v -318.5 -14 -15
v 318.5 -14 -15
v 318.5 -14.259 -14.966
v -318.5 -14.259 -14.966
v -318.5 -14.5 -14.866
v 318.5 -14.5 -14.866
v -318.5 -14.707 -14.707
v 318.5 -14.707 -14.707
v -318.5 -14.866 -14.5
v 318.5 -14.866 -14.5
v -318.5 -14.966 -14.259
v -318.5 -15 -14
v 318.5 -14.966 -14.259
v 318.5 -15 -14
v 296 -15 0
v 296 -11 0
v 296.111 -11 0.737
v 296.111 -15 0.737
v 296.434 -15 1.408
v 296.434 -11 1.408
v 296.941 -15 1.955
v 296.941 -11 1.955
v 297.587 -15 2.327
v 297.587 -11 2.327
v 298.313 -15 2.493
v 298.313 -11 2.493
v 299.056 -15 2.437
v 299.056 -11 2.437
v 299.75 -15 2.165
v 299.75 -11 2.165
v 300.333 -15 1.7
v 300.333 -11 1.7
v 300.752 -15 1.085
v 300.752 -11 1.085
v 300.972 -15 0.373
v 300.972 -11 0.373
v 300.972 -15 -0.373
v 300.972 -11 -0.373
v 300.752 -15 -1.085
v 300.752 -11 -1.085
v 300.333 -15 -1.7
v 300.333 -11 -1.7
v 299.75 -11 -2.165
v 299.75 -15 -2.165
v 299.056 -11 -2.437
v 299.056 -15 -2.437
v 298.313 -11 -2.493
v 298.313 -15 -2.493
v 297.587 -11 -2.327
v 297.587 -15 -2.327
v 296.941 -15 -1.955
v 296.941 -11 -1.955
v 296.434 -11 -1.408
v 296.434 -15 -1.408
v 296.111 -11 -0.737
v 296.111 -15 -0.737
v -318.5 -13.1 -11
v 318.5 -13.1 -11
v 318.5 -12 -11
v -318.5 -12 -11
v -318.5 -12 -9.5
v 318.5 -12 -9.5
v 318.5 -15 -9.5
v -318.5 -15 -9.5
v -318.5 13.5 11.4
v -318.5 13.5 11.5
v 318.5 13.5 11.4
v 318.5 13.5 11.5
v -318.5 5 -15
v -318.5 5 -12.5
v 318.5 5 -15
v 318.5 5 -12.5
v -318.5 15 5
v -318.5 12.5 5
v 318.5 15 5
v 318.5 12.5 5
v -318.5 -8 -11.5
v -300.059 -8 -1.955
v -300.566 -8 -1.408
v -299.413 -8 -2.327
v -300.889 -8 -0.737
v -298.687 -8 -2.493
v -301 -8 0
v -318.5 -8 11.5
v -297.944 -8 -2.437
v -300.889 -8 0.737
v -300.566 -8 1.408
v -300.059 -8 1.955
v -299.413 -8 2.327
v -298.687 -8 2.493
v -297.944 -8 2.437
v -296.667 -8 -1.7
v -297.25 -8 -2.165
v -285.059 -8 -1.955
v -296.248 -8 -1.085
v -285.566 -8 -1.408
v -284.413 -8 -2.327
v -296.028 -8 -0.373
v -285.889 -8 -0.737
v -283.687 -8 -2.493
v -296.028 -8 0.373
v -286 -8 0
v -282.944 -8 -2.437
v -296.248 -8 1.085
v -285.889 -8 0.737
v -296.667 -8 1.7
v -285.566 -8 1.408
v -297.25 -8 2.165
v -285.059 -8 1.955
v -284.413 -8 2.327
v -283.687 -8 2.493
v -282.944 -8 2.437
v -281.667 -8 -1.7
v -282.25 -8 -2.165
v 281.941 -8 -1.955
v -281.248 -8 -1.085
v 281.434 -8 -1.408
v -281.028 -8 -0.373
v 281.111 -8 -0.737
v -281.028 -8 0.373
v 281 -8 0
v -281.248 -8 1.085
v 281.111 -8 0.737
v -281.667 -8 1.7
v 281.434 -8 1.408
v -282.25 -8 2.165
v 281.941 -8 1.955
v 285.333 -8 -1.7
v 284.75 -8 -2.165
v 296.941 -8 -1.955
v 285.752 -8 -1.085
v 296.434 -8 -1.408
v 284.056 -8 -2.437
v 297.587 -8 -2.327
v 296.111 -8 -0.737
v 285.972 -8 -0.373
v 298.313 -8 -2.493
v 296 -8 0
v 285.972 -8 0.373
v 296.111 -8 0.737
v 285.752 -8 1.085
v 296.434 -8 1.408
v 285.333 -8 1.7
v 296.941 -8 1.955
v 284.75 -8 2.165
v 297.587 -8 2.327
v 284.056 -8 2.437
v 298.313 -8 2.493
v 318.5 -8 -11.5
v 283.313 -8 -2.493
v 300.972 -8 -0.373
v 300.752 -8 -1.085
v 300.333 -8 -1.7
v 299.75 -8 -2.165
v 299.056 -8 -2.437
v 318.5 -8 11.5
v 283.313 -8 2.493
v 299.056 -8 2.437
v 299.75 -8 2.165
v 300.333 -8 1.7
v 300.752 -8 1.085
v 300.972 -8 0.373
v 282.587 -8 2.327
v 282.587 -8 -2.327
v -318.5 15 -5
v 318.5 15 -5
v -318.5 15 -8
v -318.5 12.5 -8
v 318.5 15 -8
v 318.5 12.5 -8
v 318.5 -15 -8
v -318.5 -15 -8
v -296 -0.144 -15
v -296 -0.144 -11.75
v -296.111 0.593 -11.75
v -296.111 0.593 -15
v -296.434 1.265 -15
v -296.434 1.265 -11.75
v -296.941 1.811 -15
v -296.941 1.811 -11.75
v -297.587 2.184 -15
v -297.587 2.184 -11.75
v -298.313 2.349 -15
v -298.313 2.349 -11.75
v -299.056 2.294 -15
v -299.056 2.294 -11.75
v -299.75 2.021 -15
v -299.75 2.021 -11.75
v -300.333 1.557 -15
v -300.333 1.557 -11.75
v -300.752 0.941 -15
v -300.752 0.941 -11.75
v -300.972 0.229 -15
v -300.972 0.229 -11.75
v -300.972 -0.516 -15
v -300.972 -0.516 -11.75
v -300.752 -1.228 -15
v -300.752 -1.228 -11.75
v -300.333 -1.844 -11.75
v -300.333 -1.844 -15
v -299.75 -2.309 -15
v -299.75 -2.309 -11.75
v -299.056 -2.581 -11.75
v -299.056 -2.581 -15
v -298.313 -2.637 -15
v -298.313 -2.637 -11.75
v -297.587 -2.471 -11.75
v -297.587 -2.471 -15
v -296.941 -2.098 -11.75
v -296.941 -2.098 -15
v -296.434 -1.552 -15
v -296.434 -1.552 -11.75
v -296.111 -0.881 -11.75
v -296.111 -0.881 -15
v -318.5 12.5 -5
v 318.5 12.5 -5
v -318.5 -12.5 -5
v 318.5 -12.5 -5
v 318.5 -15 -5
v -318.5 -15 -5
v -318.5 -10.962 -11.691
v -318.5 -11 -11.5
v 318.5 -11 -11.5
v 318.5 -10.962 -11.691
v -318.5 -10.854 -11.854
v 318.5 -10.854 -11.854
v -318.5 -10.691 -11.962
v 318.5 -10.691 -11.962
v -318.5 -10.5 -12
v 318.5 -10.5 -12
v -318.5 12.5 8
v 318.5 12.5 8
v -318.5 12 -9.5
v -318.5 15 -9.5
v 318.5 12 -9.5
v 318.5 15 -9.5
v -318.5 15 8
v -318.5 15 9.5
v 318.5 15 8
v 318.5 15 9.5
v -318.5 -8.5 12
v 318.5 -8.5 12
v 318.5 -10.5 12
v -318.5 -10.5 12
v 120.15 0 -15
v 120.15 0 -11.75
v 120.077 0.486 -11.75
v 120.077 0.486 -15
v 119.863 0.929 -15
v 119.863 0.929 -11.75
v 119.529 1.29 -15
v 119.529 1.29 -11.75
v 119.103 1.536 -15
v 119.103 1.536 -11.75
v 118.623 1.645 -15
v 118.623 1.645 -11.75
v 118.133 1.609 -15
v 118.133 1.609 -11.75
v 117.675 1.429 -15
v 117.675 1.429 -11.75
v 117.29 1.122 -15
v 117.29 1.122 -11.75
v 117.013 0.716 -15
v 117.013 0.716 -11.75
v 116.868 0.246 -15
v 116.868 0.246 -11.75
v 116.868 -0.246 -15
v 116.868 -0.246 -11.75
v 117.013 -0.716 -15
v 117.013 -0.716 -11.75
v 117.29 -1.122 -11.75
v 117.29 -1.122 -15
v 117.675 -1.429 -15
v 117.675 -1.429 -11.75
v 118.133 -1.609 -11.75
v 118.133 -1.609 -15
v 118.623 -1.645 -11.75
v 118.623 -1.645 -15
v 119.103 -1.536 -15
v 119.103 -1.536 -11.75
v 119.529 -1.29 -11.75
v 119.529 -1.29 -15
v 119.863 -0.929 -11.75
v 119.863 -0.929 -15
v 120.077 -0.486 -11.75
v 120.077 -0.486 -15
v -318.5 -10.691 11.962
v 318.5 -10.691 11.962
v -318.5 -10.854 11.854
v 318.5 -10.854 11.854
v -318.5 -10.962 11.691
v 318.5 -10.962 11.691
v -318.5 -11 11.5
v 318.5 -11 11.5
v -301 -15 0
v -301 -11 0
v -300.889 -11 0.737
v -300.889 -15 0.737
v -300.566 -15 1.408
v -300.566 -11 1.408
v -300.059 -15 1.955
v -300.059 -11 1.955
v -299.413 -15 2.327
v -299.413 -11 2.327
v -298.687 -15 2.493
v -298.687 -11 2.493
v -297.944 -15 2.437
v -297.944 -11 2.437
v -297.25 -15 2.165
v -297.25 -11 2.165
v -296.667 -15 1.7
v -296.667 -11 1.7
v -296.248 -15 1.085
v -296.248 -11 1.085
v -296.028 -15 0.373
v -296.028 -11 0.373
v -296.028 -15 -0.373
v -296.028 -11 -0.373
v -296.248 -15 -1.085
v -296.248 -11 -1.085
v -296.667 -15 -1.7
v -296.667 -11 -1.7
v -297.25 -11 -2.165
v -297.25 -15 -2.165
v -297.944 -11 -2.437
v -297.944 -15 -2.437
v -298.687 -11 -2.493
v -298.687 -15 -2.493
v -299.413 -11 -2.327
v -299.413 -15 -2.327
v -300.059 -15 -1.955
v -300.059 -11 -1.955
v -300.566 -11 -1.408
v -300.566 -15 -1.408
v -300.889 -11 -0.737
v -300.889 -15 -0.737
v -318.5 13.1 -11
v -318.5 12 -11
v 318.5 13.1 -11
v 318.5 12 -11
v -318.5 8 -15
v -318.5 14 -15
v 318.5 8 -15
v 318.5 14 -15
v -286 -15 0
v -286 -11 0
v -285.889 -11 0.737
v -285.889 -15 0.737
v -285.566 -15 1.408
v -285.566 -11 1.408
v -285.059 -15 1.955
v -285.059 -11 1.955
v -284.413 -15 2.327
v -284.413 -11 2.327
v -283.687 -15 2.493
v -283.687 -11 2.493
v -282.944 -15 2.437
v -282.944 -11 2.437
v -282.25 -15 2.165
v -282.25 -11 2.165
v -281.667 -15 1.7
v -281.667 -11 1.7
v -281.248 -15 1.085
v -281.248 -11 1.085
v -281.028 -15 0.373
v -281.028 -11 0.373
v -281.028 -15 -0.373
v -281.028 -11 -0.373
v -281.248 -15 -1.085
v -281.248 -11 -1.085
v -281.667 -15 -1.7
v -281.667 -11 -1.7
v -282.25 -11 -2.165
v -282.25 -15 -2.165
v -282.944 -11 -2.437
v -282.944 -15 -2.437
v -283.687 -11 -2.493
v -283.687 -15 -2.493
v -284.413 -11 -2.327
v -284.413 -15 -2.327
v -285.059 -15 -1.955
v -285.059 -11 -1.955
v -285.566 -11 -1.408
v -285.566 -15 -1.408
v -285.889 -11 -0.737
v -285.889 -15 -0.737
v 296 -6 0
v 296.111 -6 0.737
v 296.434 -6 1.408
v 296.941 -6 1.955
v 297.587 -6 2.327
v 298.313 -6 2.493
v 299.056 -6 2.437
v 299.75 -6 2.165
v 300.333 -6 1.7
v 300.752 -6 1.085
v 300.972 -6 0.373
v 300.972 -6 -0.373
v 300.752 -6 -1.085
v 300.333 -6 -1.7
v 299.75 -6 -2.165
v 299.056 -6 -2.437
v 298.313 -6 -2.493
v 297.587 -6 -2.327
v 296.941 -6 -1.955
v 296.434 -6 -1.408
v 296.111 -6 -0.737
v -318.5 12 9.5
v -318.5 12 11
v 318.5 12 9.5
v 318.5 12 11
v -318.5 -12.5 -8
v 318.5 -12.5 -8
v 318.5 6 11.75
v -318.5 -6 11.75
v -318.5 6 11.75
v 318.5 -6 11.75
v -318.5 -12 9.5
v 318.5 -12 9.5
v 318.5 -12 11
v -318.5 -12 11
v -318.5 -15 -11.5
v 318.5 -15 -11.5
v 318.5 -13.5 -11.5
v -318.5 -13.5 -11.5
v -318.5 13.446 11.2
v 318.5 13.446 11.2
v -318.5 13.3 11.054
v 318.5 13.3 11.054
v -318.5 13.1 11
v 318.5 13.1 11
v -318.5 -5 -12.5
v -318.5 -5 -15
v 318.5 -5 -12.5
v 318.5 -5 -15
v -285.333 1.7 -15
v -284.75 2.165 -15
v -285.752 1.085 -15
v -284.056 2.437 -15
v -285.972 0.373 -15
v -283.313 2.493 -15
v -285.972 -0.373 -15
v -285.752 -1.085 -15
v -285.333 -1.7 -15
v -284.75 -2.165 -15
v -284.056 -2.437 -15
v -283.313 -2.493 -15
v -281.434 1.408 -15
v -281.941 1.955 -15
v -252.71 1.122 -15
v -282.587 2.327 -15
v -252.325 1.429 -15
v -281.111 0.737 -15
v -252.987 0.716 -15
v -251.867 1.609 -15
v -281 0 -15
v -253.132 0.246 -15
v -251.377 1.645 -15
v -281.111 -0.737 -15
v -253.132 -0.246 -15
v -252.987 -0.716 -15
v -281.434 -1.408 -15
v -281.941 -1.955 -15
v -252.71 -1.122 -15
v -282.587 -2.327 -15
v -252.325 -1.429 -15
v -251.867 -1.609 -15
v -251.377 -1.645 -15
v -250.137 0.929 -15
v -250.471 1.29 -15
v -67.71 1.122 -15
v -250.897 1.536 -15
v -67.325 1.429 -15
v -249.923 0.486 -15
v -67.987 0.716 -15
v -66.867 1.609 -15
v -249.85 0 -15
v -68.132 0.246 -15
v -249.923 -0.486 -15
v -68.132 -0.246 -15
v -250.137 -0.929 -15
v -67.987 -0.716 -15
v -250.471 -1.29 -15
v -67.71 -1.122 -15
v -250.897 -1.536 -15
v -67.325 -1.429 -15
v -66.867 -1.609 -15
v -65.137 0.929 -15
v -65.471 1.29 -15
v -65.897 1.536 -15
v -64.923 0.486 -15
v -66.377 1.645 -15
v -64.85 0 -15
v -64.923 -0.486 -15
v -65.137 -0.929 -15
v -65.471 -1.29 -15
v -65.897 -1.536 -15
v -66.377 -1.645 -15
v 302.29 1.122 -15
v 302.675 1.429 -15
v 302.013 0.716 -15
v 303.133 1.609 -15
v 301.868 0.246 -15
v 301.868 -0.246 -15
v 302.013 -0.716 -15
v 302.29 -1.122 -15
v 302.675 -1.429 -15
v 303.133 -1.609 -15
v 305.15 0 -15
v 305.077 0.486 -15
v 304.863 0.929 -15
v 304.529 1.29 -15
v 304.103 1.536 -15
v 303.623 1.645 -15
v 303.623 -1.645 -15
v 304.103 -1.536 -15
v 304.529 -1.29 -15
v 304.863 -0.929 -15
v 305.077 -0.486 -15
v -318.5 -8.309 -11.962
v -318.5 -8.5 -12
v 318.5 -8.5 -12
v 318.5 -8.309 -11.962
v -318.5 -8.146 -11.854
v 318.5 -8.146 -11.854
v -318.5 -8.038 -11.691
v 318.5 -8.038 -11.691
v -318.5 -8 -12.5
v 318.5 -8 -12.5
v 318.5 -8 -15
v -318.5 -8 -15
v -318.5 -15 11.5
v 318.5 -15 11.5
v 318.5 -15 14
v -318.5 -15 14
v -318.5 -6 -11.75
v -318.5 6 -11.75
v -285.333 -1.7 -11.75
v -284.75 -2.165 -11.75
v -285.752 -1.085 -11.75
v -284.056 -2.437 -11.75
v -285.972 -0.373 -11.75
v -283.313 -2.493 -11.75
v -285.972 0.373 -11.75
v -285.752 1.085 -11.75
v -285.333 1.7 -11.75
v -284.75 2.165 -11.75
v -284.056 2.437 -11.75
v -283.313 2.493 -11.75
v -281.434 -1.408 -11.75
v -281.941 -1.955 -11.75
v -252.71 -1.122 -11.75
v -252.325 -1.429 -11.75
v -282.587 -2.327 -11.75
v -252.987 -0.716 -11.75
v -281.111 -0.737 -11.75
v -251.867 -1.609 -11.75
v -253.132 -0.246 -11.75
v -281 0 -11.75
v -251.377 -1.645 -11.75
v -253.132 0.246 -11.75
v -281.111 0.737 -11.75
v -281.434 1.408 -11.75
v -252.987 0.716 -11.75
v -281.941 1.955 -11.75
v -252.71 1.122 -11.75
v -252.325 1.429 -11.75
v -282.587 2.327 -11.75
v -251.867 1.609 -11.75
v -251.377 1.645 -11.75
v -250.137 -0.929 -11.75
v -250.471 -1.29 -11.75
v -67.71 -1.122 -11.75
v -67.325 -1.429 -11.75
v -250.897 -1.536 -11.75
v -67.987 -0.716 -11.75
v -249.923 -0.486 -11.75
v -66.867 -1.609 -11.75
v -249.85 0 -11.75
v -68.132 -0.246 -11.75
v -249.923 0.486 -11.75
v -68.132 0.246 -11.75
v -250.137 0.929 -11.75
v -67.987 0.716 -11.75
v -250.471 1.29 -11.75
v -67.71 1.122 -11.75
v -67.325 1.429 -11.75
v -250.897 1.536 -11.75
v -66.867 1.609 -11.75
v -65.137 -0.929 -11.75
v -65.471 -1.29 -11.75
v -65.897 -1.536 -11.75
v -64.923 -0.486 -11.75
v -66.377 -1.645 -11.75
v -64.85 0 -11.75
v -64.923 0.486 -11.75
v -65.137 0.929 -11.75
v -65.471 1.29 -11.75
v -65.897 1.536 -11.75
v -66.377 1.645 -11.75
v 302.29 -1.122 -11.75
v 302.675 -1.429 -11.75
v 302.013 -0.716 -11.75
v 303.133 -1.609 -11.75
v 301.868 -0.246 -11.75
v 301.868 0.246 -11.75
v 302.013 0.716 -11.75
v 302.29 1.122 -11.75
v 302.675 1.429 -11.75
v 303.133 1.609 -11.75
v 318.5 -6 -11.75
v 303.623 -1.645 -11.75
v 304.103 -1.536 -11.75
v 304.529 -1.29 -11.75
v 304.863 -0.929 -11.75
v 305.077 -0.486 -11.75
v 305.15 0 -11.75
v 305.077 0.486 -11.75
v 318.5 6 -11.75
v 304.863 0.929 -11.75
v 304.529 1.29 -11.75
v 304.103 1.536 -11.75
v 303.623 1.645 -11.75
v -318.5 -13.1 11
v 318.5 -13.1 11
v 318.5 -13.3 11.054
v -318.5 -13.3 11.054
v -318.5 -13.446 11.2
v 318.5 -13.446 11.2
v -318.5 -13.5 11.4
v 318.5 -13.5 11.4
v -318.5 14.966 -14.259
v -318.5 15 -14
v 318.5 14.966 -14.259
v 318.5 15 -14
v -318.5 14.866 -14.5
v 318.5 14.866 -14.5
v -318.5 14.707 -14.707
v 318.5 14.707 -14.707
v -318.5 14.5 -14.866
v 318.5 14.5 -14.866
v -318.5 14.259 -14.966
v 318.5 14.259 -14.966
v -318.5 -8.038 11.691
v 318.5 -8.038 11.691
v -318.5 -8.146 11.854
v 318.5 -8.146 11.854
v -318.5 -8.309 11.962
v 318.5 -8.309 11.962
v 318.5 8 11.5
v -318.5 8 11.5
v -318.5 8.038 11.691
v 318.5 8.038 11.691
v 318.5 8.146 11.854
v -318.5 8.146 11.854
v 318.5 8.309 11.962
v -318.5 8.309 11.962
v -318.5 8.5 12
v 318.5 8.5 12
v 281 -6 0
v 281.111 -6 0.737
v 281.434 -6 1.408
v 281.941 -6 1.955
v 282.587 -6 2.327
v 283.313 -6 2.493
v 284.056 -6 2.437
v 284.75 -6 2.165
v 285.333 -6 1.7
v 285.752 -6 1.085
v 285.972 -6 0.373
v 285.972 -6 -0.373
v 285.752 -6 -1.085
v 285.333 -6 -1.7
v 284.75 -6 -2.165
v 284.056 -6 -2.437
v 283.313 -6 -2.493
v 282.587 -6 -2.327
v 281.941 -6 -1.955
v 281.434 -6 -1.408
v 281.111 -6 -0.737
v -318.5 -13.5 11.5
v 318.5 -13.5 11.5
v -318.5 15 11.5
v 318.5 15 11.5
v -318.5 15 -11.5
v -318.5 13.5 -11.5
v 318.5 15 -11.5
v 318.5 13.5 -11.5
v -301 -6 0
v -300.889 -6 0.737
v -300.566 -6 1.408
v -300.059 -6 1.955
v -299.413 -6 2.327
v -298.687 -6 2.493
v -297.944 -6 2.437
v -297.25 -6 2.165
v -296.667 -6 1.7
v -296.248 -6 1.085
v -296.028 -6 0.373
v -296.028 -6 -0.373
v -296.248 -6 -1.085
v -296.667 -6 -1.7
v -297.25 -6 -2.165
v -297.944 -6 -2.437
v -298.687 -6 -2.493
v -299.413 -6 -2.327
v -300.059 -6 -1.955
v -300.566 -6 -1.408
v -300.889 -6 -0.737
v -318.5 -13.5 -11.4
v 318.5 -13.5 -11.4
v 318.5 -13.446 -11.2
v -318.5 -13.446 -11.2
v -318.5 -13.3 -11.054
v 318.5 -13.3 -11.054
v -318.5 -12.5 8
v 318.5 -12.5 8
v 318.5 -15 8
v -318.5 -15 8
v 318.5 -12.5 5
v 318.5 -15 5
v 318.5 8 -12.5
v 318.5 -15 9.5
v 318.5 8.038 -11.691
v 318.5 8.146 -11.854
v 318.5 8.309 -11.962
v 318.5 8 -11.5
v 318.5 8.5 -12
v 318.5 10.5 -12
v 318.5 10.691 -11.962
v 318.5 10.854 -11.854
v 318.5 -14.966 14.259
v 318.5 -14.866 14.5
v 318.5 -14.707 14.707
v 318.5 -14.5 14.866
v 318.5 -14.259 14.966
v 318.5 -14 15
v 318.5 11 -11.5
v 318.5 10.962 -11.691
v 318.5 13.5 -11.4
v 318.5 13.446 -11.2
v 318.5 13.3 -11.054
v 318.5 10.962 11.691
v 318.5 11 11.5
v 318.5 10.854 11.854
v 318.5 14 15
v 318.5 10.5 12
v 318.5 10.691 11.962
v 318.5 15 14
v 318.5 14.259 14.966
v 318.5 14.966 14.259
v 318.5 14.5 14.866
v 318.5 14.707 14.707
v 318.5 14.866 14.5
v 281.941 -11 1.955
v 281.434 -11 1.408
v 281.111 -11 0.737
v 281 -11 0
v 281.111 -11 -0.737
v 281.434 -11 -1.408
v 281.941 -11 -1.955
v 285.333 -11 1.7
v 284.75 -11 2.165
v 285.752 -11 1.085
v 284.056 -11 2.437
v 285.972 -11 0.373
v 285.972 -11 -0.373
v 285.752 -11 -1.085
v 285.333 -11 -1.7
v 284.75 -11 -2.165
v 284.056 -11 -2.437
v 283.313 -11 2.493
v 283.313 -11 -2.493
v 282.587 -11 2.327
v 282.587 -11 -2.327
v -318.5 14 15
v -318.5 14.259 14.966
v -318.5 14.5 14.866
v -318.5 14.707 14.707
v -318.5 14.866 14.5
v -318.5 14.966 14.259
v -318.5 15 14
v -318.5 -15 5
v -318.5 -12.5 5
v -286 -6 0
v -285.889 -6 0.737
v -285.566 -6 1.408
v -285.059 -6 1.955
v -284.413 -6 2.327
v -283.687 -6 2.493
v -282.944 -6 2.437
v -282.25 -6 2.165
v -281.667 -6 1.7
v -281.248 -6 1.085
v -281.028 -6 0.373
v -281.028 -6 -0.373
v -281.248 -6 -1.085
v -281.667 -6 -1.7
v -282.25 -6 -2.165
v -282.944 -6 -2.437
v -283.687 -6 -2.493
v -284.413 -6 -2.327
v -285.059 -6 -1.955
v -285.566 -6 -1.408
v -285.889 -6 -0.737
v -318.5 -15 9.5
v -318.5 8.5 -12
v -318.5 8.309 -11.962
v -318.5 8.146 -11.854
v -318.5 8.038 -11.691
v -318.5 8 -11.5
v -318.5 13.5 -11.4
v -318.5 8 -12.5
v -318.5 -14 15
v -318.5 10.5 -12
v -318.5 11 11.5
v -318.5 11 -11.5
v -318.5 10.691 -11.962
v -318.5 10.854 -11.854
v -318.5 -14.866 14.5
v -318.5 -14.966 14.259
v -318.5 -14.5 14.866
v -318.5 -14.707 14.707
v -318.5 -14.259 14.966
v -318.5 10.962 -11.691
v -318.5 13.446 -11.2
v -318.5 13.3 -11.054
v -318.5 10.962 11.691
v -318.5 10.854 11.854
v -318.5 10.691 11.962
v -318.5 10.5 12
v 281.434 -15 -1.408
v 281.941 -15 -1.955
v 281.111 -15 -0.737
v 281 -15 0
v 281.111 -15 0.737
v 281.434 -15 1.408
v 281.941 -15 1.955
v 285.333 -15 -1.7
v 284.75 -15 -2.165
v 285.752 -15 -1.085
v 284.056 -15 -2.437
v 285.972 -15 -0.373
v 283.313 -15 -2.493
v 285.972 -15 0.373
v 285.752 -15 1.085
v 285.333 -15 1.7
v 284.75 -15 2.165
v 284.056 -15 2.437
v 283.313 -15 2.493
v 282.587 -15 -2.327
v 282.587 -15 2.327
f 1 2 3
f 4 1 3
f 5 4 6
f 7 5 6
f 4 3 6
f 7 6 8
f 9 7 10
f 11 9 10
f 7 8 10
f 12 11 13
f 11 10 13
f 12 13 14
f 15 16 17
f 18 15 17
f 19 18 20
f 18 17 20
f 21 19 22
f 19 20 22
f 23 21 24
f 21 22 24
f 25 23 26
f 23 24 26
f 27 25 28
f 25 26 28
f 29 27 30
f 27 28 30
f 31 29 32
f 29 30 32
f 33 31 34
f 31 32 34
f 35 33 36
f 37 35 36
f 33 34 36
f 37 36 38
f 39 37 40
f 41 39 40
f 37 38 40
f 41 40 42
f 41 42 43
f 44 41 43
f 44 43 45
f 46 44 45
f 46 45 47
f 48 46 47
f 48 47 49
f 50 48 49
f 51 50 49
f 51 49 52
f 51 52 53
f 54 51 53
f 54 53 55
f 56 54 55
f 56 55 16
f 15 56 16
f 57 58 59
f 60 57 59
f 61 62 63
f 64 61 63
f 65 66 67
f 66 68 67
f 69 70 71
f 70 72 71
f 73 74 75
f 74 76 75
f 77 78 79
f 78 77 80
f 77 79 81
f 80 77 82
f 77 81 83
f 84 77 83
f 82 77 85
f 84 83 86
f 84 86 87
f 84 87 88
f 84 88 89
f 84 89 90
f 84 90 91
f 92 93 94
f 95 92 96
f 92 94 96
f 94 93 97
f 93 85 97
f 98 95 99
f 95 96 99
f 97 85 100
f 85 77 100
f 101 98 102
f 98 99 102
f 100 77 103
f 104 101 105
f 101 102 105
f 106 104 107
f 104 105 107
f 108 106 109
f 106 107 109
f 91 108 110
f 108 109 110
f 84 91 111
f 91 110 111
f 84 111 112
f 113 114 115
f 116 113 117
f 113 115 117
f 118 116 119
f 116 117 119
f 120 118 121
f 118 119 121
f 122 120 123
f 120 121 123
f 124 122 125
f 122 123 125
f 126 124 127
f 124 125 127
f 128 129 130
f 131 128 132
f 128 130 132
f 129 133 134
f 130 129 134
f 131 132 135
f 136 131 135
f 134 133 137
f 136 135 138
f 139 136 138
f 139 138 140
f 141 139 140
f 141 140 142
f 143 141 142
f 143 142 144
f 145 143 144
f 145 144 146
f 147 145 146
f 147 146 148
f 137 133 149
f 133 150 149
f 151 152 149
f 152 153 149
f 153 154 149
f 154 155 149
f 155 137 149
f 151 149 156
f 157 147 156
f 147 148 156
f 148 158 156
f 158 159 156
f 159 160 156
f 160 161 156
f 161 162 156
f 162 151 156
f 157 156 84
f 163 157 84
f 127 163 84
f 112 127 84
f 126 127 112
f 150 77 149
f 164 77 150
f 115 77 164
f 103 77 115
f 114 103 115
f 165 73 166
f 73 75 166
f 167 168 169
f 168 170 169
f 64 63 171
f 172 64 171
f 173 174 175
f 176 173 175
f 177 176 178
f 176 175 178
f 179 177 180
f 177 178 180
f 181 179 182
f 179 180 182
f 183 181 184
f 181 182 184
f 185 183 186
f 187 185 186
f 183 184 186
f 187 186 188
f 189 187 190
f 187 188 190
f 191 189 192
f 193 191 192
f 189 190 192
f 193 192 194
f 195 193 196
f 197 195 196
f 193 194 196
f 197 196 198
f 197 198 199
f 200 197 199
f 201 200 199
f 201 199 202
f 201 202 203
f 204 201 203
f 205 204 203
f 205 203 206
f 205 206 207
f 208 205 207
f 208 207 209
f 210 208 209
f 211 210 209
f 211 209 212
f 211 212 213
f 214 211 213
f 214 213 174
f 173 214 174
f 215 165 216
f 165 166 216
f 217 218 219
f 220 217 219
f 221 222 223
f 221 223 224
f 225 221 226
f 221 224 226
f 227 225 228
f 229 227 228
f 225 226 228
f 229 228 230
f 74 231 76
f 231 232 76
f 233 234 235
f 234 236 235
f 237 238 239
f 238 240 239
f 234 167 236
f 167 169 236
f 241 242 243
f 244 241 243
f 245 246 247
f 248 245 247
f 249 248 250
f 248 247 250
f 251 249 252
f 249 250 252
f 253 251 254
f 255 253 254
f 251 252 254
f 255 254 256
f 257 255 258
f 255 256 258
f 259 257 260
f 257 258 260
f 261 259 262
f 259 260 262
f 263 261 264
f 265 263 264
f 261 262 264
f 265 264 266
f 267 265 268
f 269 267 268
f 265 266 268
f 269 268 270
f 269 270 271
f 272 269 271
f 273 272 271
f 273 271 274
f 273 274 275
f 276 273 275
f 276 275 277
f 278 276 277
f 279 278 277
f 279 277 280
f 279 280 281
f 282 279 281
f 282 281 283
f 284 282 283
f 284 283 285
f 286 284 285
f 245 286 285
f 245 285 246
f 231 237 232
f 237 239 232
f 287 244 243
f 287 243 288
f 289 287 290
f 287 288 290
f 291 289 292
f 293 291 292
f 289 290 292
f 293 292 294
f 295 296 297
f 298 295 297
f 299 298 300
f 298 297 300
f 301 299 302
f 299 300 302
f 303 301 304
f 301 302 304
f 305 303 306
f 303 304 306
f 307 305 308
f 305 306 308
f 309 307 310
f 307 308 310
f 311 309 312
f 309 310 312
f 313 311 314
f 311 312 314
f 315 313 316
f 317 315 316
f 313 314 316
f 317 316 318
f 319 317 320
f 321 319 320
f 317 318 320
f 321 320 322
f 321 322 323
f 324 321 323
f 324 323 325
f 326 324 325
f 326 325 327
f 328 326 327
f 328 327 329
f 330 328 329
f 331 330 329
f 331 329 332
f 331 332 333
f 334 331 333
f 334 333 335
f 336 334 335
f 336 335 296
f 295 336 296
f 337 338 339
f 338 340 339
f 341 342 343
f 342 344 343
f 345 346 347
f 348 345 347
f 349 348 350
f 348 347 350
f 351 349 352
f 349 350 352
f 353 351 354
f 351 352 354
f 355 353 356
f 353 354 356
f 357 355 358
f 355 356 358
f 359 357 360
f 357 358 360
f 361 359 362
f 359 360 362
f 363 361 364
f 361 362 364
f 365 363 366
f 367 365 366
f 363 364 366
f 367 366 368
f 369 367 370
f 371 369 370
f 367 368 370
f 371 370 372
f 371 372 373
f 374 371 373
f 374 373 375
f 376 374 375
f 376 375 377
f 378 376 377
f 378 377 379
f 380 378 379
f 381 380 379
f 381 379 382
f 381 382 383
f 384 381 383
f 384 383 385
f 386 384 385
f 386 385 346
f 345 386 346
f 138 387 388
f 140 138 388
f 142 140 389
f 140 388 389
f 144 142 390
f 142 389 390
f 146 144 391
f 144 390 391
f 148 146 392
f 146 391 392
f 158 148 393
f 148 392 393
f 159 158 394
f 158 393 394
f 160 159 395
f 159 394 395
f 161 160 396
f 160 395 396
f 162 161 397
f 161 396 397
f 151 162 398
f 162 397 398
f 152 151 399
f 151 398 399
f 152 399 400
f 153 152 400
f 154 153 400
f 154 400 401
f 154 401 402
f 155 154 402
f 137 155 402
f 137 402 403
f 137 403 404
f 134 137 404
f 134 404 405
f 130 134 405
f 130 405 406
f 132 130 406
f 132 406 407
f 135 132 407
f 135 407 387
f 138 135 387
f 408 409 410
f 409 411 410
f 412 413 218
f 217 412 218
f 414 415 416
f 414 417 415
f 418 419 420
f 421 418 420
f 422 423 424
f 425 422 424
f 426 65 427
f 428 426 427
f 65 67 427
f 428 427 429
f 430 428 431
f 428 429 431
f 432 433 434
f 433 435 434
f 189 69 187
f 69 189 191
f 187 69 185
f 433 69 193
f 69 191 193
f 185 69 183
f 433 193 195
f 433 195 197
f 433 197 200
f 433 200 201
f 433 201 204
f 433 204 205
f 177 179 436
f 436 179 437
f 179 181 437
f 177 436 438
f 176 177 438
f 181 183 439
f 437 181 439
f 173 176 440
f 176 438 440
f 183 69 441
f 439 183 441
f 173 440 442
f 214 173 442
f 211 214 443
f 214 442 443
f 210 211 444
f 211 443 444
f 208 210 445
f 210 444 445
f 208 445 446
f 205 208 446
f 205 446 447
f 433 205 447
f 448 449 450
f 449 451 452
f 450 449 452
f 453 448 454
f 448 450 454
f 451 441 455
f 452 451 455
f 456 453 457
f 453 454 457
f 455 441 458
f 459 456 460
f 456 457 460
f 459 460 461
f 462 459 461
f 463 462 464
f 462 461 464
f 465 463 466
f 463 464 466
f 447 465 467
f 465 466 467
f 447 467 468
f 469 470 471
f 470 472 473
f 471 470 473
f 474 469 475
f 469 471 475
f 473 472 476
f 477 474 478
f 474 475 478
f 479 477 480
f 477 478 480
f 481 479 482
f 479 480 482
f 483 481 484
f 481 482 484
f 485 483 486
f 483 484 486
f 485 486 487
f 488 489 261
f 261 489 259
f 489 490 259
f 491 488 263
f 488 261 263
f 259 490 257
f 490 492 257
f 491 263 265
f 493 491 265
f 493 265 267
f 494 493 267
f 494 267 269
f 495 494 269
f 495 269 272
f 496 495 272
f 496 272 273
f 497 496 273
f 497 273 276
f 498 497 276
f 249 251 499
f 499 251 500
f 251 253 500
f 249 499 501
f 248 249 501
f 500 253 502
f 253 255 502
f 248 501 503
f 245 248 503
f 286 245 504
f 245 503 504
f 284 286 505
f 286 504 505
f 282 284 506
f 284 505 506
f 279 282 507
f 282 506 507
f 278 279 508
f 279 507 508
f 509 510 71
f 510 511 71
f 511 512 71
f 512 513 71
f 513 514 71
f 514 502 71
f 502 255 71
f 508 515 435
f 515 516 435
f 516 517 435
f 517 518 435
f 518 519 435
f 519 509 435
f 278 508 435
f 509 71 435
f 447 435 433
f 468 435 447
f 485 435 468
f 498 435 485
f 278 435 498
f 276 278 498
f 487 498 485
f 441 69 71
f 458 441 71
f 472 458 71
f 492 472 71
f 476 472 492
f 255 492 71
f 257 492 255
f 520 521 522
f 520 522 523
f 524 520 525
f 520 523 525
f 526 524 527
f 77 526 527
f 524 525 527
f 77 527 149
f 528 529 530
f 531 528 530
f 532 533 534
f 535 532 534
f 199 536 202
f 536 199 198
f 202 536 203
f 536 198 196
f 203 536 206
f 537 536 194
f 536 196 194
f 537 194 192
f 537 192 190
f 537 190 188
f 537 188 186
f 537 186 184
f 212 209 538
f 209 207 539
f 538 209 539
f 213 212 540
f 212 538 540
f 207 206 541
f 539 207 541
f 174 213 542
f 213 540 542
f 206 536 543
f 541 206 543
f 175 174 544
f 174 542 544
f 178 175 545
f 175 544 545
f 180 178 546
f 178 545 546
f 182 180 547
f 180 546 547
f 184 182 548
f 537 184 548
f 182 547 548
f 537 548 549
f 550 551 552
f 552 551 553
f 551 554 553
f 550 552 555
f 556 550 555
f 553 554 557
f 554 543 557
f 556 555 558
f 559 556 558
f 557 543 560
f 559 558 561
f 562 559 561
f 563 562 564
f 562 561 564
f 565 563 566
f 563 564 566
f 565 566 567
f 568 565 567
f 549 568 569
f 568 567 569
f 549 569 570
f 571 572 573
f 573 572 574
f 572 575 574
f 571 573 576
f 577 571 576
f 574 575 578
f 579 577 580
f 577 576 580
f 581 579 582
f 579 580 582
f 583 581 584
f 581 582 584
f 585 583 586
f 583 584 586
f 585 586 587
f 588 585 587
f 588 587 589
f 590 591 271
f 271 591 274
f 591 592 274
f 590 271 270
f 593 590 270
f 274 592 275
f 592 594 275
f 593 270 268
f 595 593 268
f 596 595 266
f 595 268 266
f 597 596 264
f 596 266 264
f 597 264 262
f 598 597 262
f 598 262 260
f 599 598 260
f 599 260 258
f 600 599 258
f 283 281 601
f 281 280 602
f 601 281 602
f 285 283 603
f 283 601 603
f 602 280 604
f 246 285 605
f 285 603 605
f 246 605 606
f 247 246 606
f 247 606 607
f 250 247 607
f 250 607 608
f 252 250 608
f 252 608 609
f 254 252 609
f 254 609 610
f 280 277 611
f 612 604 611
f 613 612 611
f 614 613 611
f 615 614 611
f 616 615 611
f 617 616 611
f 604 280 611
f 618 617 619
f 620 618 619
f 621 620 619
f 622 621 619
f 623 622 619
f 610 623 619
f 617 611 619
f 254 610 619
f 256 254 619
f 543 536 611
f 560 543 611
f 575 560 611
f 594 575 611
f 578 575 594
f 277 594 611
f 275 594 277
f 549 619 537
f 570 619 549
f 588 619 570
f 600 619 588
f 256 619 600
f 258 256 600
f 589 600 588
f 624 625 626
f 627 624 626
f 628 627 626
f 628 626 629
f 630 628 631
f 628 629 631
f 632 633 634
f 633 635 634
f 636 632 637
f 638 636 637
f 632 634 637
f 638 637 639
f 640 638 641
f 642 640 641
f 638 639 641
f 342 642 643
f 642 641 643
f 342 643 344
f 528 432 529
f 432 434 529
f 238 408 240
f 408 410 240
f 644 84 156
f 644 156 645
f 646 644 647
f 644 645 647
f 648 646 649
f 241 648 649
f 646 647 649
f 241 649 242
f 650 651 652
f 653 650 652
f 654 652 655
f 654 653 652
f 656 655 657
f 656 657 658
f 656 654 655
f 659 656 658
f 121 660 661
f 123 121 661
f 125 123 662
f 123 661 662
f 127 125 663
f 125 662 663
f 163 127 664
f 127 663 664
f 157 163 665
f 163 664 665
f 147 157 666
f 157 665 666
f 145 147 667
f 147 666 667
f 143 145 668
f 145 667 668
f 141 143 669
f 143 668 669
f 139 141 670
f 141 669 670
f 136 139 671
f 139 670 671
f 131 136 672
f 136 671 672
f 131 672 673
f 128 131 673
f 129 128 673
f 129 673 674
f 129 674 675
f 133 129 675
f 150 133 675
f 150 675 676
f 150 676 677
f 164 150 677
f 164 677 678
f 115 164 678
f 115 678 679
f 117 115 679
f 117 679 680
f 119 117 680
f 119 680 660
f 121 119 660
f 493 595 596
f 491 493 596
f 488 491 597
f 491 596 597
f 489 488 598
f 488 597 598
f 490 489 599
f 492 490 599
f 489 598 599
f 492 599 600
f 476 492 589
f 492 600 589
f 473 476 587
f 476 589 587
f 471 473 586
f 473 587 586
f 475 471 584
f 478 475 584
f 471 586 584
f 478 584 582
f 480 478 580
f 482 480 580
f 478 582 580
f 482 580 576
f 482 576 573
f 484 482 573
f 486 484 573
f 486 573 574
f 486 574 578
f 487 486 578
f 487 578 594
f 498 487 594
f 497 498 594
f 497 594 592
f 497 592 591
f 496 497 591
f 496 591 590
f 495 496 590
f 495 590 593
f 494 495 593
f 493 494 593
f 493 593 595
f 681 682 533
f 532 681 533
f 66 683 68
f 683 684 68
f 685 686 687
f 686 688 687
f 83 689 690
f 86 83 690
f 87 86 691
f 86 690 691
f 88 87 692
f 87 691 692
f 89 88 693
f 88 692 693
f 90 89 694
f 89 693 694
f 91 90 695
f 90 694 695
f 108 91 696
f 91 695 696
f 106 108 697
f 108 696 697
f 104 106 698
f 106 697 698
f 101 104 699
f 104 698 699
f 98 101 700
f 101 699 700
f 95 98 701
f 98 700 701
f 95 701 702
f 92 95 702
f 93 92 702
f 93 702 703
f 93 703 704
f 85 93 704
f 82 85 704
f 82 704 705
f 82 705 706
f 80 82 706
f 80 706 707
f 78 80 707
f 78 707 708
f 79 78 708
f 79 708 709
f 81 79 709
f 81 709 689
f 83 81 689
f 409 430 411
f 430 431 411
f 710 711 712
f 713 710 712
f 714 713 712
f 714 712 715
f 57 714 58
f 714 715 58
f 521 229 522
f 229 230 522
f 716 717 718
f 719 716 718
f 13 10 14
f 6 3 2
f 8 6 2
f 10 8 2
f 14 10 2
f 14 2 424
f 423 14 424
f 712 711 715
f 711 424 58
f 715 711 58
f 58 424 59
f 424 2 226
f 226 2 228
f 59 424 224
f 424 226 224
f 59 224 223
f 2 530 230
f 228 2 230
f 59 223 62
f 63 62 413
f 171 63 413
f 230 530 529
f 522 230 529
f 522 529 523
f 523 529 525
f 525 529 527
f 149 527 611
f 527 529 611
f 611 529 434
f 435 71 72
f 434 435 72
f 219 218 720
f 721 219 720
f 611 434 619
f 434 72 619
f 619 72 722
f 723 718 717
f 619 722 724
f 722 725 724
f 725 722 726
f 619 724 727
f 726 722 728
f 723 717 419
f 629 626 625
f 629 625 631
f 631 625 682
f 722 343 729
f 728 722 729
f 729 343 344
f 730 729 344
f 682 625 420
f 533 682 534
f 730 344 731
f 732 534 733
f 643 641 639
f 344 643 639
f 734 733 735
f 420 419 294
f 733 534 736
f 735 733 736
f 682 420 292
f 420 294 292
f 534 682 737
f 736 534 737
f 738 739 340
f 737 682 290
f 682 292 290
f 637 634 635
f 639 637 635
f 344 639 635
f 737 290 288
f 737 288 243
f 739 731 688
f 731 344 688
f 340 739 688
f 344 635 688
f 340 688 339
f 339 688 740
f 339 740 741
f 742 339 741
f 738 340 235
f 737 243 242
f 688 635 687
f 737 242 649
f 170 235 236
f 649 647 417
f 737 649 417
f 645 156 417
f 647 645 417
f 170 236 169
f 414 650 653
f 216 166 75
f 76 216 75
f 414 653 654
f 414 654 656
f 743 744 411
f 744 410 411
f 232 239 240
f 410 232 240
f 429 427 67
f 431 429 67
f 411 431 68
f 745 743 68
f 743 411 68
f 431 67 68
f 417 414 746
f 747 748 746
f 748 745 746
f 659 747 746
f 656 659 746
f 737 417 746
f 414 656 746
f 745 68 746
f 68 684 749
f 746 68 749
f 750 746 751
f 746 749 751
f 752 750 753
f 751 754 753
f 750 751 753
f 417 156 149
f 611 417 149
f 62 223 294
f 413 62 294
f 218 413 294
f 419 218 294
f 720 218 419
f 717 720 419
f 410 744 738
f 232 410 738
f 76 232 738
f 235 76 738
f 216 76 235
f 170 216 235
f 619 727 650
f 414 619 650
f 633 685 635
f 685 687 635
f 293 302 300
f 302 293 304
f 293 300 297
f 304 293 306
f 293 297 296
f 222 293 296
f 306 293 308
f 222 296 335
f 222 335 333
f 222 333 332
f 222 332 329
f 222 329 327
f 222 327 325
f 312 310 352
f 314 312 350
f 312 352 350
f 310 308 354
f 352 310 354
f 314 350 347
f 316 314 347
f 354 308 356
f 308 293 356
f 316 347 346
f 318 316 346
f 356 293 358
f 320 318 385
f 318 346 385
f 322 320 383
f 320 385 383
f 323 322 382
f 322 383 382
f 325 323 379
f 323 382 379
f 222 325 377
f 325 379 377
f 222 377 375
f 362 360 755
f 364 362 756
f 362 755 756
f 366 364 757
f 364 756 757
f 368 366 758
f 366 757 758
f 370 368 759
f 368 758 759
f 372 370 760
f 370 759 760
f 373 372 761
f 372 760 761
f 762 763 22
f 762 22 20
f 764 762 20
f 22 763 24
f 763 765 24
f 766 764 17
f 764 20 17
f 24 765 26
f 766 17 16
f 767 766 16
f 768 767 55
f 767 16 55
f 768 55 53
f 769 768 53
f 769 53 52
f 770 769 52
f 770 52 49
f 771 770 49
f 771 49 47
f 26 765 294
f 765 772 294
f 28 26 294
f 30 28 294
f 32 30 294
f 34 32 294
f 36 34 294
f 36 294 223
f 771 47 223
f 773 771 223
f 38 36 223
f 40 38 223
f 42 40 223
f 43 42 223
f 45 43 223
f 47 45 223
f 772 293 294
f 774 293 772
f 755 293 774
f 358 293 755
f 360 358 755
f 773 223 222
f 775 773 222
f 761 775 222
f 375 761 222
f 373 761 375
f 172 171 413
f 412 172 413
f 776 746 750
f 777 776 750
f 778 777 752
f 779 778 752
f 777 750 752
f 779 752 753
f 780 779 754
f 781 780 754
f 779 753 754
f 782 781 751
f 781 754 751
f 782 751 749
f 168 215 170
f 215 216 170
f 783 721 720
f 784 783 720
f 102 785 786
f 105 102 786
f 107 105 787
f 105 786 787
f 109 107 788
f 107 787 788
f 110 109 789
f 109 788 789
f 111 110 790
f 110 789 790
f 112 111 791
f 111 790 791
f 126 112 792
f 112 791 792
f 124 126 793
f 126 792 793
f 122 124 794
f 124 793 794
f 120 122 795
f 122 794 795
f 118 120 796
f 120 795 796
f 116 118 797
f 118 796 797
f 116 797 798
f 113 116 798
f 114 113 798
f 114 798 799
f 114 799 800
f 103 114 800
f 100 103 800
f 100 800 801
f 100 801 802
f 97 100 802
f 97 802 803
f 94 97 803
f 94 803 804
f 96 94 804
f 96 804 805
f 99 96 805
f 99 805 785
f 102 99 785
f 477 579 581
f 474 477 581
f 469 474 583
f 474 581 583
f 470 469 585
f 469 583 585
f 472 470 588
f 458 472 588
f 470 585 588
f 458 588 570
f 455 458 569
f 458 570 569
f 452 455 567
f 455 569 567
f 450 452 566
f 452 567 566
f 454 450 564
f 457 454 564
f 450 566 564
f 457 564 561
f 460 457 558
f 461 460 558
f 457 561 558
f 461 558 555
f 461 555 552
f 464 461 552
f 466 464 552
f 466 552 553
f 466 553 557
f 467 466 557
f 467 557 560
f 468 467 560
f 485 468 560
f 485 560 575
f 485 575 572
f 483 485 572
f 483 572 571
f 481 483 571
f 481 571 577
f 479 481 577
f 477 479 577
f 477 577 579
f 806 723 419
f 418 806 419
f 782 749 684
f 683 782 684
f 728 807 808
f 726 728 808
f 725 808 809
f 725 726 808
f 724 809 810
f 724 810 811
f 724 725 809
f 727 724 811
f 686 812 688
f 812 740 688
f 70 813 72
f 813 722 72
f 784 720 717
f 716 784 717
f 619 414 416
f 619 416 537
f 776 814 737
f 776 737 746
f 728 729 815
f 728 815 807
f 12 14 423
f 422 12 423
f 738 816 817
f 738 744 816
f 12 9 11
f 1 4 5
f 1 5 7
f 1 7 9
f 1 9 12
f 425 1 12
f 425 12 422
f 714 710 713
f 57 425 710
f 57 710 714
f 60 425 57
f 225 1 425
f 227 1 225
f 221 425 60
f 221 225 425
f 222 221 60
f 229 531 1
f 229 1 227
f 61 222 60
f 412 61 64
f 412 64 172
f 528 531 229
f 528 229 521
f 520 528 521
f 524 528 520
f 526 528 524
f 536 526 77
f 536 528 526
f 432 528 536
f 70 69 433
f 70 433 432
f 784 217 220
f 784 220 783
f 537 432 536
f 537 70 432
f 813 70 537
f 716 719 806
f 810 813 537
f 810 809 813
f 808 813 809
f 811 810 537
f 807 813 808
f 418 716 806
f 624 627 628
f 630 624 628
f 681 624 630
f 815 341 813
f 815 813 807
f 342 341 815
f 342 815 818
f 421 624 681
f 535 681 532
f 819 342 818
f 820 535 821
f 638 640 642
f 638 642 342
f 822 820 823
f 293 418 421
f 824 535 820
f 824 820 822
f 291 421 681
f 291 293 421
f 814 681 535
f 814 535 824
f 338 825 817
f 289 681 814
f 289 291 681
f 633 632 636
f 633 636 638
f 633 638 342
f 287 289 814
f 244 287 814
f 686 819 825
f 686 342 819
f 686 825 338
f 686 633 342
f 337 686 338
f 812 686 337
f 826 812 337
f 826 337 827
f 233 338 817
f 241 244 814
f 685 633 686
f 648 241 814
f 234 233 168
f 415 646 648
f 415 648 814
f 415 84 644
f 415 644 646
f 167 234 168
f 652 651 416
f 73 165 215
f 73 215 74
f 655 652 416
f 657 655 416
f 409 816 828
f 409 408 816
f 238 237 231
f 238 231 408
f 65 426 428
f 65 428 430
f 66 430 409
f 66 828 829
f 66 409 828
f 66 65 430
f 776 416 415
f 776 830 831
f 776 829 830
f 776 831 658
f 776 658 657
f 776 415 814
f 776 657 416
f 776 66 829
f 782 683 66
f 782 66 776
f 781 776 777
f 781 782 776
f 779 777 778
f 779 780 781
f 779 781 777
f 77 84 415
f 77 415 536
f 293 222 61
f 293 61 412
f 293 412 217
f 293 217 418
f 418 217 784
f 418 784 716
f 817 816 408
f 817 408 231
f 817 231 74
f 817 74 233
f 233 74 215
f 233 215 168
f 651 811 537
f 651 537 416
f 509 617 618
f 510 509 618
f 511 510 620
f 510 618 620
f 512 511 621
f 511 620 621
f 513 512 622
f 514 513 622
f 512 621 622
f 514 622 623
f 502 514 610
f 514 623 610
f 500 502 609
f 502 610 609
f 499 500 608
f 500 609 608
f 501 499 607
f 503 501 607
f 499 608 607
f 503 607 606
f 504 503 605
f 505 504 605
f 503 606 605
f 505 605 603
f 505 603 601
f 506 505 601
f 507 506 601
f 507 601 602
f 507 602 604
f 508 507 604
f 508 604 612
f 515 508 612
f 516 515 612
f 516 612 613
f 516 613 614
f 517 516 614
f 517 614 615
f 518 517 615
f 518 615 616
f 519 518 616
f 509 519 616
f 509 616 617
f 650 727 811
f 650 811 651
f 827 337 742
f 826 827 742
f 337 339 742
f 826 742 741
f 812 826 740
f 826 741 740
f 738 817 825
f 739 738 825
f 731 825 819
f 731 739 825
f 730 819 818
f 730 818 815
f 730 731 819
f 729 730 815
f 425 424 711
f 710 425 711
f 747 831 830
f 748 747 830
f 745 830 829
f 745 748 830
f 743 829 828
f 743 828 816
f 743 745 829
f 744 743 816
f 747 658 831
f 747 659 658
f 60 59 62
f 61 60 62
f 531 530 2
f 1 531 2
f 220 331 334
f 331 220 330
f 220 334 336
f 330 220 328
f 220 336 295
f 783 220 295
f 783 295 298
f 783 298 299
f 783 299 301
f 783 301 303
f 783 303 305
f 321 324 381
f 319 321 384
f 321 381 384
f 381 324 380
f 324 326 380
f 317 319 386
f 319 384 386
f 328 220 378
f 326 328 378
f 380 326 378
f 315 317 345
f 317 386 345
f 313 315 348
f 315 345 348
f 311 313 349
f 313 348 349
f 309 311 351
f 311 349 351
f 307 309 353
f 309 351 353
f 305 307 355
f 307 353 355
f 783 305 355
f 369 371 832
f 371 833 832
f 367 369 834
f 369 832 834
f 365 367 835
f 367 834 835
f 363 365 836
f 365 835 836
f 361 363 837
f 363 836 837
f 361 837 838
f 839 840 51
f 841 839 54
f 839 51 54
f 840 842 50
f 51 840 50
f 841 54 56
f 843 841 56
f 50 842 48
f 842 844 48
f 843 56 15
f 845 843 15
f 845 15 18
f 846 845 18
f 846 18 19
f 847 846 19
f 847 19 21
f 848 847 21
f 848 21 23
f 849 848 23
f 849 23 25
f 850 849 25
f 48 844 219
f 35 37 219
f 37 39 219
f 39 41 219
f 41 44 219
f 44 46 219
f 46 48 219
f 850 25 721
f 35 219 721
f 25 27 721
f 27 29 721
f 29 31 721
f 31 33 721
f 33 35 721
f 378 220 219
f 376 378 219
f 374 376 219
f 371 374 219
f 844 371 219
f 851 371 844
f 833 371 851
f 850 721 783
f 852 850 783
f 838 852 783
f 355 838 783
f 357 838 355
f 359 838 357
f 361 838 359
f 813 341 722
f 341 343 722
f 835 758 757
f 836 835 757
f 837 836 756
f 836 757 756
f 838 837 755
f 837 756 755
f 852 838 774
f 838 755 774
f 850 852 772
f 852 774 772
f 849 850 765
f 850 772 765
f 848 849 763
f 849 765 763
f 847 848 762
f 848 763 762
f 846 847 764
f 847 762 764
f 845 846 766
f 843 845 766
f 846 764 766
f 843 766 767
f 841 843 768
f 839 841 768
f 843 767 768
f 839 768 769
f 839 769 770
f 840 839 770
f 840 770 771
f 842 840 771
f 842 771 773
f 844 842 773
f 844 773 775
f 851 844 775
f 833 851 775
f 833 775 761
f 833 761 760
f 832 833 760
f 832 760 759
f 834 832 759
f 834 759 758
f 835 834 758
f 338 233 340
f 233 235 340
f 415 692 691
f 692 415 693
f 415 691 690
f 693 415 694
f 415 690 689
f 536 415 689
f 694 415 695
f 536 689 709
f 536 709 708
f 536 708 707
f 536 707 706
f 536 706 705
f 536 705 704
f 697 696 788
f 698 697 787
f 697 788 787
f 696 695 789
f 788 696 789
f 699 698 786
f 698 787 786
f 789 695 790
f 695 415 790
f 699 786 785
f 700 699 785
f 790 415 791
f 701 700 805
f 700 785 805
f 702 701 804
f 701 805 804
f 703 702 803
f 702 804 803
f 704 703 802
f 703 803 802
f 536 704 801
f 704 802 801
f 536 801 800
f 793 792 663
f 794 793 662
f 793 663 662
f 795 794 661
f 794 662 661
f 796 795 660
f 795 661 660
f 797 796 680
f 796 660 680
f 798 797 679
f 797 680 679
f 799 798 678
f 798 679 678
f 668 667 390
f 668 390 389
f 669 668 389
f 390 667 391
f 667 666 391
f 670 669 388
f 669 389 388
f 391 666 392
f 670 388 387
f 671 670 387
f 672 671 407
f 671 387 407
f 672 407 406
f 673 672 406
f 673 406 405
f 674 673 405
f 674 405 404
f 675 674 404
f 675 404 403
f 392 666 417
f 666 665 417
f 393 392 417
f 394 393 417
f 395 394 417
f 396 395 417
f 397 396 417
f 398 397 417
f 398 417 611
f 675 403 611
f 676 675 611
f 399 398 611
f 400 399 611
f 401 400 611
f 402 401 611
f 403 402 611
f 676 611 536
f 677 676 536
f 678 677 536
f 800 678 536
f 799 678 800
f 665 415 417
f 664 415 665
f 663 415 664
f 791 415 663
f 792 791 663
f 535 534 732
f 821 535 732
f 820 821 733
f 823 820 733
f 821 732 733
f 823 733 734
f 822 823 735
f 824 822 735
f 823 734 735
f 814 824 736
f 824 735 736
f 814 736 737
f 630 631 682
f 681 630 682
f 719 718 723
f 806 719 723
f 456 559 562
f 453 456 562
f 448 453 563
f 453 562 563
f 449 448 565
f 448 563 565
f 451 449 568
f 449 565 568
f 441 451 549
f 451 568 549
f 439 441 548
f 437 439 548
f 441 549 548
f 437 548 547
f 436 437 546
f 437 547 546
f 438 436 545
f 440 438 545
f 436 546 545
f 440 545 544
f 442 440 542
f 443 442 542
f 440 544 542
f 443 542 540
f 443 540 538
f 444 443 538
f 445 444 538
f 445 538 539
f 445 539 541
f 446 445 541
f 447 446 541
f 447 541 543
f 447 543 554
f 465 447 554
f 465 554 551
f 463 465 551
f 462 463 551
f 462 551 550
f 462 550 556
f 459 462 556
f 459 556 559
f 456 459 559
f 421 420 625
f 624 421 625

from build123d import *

# Parameters (mm, degrees)
SKETCH_1_W             = 23.5
SKETCH_1_H             = 12
EXTRUDE_1_DEPTH        = 318.5
HOLE_WIZARD_M6_1_D     = 5
HOLE_WIZARD_M6_1_DEPTH = 15
HOLE_WIZARD_M6_1_TIP   = 1.502151548
HOLE_WIZARD_M6_2_D     = 5
HOLE_WIZARD_M6_2_DEPTH = 15
HOLE_WIZARD_M6_2_TIP   = 1.502151548
HOLE_WIZARD_M4_1_D     = 3.3
HOLE_WIZARD_M4_1_DEPTH = 10.1
HOLE_WIZARD_M4_1_TIP   = 0.991420021


with BuildPart() as part:
    # 草图1 → 凸台-拉伸1 (new, symmetric)
    with BuildSketch(Plane(origin=(0, 0, 0), x_dir=(0, 0, -1), z_dir=(1, 0, 0))):
        with BuildLine():
            Line((-14, 15), (-11.5, 15))
            Line((-11.5, 15), (-11.5, 13.5))
            Line((-11.5, 13.5), (-11.4, 13.5))
            ThreePointArc((-11.4, 13.5), (-11.117157288, 13.382842712), (-11, 13.1))
            Line((-11, 13.1), (-11, 12))
            Line((-11, 12), (-9.5, 12))
            Line((-9.5, 12), (-9.5, 15))
            Line((-9.5, 15), (-8, 15))
            Line((-8, 15), (-8, 12.5))
            Line((-8, 12.5), (-5, 12.5))
            Line((-5, 12.5), (-5, 15))
            Line((-5, 15), (5, 15))
            Line((5, 15), (5, 12.5))
            Line((5, 12.5), (8, 12.5))
            Line((8, 12.5), (8, 15))
            Line((8, 15), (9.5, 15))
            Line((9.5, 15), (9.5, 12))
            Line((9.5, 12), (11, 12))
            Line((11, 12), (11, 13.1))
            ThreePointArc((11, 13.1), (11.117157288, 13.382842712), (11.4, 13.5))
            Line((11.4, 13.5), (11.5, 13.5))
            Line((11.5, 13.5), (11.5, 15))
            Line((11.5, 15), (14, 15))
            ThreePointArc((14, 15), (14.707106781, 14.707106781), (15, 14))
            Line((15, 14), (15, 8))
            Line((15, 8), (12.5, 8))
            Line((12.5, 8), (12.5, 5))
            Line((12.5, 5), (15, 5))
            Line((15, 5), (15, -5))
            Line((15, -5), (12.5, -5))
            Line((12.5, -5), (12.5, -8))
            Line((12.5, -8), (15, -8))
            Line((15, -8), (15, -14))
            ThreePointArc((15, -14), (14.707106781, -14.707106781), (14, -15))
            Line((14, -15), (11.5, -15))
            Line((11.5, -15), (11.5, -13.5))
            Line((11.5, -13.5), (11.4, -13.5))
            ThreePointArc((11.4, -13.5), (11.117157288, -13.382842712), (11, -13.1))
            Line((11, -13.1), (11, -12))
            Line((11, -12), (9.5, -12))
            Line((9.5, -12), (9.5, -15))
            Line((9.5, -15), (8, -15))
            Line((8, -15), (8, -12.5))
            Line((8, -12.5), (5, -12.5))
            Line((5, -12.5), (5, -15))
            Line((5, -15), (-5, -15))
            Line((-5, -15), (-5, -12.5))
            Line((-5, -12.5), (-8, -12.5))
            Line((-8, -12.5), (-8, -15))
            Line((-8, -15), (-9.5, -15))
            Line((-9.5, -15), (-9.5, -12))
            Line((-9.5, -12), (-11, -12))
            Line((-11, -12), (-11, -13.1))
            ThreePointArc((-11, -13.1), (-11.117157288, -13.382842712), (-11.4, -13.5))
            Line((-11.4, -13.5), (-11.5, -13.5))
            Line((-11.5, -13.5), (-11.5, -15))
            Line((-11.5, -15), (-14, -15))
            ThreePointArc((-14, -15), (-14.707106781, -14.707106781), (-15, -14))
            Line((-15, -14), (-15, 14))
            ThreePointArc((-15, 14), (-14.707106781, 14.707106781), (-14, 15))
        make_face()
        with BuildLine():
            Line((12, -10.5), (12, -8.5))
            ThreePointArc((12, -8.5), (11.853553391, -8.146446609), (11.5, -8))
            Line((11.5, -8), (-11.5, -8))
            ThreePointArc((-11.5, -8), (-11.853553391, -8.146446609), (-12, -8.5))
            Line((-12, -8.5), (-12, -10.5))
            ThreePointArc((-12, -10.5), (-11.853553391, -10.853553391), (-11.5, -11))
            Line((-11.5, -11), (11.5, -11))
            ThreePointArc((11.5, -11), (11.853553391, -10.853553391), (12, -10.5))
        make_face(mode=Mode.SUBTRACT)
        with BuildLine():
            Line((-11.5, 11), (11.5, 11))
            ThreePointArc((11.5, 11), (11.853553391, 10.853553391), (12, 10.5))
            Line((12, 10.5), (12, 8.5))
            ThreePointArc((12, 8.5), (11.853553391, 8.146446609), (11.5, 8))
            Line((11.5, 8), (-11.5, 8))
            ThreePointArc((-11.5, 8), (-11.853553391, 8.146446609), (-12, 8.5))
            Line((-12, 8.5), (-12, 10.5))
            ThreePointArc((-12, 10.5), (-11.853553391, 10.853553391), (-11.5, 11))
        make_face(mode=Mode.SUBTRACT)
        Rectangle(SKETCH_1_W, SKETCH_1_H, mode=Mode.SUBTRACT)
    extrude(amount=EXTRUDE_1_DEPTH, both=True)

    # M6 螺纹孔1
    with Locations(Plane(origin=(0, 0, -15), x_dir=(-1, 0, 0), z_dir=(0, 0, -1))):
        with Locations((298.5, -0.143680977), (283.5, 0)):
            Hole(HOLE_WIZARD_M6_1_D / 2, depth=HOLE_WIZARD_M6_1_DEPTH)
            with Locations((0, 0, -(HOLE_WIZARD_M6_1_DEPTH + HOLE_WIZARD_M6_1_TIP / 2))):  # 118° drill point
                Cone(0, HOLE_WIZARD_M6_1_D / 2, HOLE_WIZARD_M6_1_TIP, mode=Mode.SUBTRACT)

    # M6 螺纹孔2
    with Locations(Plane.XZ.offset(15)):
        with Locations((-298.5, 0), (-283.5, 0), (283.5, 0), (298.5, 0)):
            Hole(HOLE_WIZARD_M6_2_D / 2, depth=HOLE_WIZARD_M6_2_DEPTH)
            with Locations((0, 0, -(HOLE_WIZARD_M6_2_DEPTH + HOLE_WIZARD_M6_2_TIP / 2))):  # 118° drill point
                Cone(0, HOLE_WIZARD_M6_2_D / 2, HOLE_WIZARD_M6_2_TIP, mode=Mode.SUBTRACT)

    # M4 螺纹孔1
    with Locations(Plane(origin=(0, 0, -15), x_dir=(-1, 0, 0), z_dir=(0, 0, -1))):
        with Locations((-303.5, 0), (-118.5, 0), (66.5, 0), (251.5, 0)):
            Hole(HOLE_WIZARD_M4_1_D / 2, depth=HOLE_WIZARD_M4_1_DEPTH)
            with Locations((0, 0, -(HOLE_WIZARD_M4_1_DEPTH + HOLE_WIZARD_M4_1_TIP / 2))):  # 118° drill point
                Cone(0, HOLE_WIZARD_M4_1_D / 2, HOLE_WIZARD_M4_1_TIP, mode=Mode.SUBTRACT)


solid = part.part
